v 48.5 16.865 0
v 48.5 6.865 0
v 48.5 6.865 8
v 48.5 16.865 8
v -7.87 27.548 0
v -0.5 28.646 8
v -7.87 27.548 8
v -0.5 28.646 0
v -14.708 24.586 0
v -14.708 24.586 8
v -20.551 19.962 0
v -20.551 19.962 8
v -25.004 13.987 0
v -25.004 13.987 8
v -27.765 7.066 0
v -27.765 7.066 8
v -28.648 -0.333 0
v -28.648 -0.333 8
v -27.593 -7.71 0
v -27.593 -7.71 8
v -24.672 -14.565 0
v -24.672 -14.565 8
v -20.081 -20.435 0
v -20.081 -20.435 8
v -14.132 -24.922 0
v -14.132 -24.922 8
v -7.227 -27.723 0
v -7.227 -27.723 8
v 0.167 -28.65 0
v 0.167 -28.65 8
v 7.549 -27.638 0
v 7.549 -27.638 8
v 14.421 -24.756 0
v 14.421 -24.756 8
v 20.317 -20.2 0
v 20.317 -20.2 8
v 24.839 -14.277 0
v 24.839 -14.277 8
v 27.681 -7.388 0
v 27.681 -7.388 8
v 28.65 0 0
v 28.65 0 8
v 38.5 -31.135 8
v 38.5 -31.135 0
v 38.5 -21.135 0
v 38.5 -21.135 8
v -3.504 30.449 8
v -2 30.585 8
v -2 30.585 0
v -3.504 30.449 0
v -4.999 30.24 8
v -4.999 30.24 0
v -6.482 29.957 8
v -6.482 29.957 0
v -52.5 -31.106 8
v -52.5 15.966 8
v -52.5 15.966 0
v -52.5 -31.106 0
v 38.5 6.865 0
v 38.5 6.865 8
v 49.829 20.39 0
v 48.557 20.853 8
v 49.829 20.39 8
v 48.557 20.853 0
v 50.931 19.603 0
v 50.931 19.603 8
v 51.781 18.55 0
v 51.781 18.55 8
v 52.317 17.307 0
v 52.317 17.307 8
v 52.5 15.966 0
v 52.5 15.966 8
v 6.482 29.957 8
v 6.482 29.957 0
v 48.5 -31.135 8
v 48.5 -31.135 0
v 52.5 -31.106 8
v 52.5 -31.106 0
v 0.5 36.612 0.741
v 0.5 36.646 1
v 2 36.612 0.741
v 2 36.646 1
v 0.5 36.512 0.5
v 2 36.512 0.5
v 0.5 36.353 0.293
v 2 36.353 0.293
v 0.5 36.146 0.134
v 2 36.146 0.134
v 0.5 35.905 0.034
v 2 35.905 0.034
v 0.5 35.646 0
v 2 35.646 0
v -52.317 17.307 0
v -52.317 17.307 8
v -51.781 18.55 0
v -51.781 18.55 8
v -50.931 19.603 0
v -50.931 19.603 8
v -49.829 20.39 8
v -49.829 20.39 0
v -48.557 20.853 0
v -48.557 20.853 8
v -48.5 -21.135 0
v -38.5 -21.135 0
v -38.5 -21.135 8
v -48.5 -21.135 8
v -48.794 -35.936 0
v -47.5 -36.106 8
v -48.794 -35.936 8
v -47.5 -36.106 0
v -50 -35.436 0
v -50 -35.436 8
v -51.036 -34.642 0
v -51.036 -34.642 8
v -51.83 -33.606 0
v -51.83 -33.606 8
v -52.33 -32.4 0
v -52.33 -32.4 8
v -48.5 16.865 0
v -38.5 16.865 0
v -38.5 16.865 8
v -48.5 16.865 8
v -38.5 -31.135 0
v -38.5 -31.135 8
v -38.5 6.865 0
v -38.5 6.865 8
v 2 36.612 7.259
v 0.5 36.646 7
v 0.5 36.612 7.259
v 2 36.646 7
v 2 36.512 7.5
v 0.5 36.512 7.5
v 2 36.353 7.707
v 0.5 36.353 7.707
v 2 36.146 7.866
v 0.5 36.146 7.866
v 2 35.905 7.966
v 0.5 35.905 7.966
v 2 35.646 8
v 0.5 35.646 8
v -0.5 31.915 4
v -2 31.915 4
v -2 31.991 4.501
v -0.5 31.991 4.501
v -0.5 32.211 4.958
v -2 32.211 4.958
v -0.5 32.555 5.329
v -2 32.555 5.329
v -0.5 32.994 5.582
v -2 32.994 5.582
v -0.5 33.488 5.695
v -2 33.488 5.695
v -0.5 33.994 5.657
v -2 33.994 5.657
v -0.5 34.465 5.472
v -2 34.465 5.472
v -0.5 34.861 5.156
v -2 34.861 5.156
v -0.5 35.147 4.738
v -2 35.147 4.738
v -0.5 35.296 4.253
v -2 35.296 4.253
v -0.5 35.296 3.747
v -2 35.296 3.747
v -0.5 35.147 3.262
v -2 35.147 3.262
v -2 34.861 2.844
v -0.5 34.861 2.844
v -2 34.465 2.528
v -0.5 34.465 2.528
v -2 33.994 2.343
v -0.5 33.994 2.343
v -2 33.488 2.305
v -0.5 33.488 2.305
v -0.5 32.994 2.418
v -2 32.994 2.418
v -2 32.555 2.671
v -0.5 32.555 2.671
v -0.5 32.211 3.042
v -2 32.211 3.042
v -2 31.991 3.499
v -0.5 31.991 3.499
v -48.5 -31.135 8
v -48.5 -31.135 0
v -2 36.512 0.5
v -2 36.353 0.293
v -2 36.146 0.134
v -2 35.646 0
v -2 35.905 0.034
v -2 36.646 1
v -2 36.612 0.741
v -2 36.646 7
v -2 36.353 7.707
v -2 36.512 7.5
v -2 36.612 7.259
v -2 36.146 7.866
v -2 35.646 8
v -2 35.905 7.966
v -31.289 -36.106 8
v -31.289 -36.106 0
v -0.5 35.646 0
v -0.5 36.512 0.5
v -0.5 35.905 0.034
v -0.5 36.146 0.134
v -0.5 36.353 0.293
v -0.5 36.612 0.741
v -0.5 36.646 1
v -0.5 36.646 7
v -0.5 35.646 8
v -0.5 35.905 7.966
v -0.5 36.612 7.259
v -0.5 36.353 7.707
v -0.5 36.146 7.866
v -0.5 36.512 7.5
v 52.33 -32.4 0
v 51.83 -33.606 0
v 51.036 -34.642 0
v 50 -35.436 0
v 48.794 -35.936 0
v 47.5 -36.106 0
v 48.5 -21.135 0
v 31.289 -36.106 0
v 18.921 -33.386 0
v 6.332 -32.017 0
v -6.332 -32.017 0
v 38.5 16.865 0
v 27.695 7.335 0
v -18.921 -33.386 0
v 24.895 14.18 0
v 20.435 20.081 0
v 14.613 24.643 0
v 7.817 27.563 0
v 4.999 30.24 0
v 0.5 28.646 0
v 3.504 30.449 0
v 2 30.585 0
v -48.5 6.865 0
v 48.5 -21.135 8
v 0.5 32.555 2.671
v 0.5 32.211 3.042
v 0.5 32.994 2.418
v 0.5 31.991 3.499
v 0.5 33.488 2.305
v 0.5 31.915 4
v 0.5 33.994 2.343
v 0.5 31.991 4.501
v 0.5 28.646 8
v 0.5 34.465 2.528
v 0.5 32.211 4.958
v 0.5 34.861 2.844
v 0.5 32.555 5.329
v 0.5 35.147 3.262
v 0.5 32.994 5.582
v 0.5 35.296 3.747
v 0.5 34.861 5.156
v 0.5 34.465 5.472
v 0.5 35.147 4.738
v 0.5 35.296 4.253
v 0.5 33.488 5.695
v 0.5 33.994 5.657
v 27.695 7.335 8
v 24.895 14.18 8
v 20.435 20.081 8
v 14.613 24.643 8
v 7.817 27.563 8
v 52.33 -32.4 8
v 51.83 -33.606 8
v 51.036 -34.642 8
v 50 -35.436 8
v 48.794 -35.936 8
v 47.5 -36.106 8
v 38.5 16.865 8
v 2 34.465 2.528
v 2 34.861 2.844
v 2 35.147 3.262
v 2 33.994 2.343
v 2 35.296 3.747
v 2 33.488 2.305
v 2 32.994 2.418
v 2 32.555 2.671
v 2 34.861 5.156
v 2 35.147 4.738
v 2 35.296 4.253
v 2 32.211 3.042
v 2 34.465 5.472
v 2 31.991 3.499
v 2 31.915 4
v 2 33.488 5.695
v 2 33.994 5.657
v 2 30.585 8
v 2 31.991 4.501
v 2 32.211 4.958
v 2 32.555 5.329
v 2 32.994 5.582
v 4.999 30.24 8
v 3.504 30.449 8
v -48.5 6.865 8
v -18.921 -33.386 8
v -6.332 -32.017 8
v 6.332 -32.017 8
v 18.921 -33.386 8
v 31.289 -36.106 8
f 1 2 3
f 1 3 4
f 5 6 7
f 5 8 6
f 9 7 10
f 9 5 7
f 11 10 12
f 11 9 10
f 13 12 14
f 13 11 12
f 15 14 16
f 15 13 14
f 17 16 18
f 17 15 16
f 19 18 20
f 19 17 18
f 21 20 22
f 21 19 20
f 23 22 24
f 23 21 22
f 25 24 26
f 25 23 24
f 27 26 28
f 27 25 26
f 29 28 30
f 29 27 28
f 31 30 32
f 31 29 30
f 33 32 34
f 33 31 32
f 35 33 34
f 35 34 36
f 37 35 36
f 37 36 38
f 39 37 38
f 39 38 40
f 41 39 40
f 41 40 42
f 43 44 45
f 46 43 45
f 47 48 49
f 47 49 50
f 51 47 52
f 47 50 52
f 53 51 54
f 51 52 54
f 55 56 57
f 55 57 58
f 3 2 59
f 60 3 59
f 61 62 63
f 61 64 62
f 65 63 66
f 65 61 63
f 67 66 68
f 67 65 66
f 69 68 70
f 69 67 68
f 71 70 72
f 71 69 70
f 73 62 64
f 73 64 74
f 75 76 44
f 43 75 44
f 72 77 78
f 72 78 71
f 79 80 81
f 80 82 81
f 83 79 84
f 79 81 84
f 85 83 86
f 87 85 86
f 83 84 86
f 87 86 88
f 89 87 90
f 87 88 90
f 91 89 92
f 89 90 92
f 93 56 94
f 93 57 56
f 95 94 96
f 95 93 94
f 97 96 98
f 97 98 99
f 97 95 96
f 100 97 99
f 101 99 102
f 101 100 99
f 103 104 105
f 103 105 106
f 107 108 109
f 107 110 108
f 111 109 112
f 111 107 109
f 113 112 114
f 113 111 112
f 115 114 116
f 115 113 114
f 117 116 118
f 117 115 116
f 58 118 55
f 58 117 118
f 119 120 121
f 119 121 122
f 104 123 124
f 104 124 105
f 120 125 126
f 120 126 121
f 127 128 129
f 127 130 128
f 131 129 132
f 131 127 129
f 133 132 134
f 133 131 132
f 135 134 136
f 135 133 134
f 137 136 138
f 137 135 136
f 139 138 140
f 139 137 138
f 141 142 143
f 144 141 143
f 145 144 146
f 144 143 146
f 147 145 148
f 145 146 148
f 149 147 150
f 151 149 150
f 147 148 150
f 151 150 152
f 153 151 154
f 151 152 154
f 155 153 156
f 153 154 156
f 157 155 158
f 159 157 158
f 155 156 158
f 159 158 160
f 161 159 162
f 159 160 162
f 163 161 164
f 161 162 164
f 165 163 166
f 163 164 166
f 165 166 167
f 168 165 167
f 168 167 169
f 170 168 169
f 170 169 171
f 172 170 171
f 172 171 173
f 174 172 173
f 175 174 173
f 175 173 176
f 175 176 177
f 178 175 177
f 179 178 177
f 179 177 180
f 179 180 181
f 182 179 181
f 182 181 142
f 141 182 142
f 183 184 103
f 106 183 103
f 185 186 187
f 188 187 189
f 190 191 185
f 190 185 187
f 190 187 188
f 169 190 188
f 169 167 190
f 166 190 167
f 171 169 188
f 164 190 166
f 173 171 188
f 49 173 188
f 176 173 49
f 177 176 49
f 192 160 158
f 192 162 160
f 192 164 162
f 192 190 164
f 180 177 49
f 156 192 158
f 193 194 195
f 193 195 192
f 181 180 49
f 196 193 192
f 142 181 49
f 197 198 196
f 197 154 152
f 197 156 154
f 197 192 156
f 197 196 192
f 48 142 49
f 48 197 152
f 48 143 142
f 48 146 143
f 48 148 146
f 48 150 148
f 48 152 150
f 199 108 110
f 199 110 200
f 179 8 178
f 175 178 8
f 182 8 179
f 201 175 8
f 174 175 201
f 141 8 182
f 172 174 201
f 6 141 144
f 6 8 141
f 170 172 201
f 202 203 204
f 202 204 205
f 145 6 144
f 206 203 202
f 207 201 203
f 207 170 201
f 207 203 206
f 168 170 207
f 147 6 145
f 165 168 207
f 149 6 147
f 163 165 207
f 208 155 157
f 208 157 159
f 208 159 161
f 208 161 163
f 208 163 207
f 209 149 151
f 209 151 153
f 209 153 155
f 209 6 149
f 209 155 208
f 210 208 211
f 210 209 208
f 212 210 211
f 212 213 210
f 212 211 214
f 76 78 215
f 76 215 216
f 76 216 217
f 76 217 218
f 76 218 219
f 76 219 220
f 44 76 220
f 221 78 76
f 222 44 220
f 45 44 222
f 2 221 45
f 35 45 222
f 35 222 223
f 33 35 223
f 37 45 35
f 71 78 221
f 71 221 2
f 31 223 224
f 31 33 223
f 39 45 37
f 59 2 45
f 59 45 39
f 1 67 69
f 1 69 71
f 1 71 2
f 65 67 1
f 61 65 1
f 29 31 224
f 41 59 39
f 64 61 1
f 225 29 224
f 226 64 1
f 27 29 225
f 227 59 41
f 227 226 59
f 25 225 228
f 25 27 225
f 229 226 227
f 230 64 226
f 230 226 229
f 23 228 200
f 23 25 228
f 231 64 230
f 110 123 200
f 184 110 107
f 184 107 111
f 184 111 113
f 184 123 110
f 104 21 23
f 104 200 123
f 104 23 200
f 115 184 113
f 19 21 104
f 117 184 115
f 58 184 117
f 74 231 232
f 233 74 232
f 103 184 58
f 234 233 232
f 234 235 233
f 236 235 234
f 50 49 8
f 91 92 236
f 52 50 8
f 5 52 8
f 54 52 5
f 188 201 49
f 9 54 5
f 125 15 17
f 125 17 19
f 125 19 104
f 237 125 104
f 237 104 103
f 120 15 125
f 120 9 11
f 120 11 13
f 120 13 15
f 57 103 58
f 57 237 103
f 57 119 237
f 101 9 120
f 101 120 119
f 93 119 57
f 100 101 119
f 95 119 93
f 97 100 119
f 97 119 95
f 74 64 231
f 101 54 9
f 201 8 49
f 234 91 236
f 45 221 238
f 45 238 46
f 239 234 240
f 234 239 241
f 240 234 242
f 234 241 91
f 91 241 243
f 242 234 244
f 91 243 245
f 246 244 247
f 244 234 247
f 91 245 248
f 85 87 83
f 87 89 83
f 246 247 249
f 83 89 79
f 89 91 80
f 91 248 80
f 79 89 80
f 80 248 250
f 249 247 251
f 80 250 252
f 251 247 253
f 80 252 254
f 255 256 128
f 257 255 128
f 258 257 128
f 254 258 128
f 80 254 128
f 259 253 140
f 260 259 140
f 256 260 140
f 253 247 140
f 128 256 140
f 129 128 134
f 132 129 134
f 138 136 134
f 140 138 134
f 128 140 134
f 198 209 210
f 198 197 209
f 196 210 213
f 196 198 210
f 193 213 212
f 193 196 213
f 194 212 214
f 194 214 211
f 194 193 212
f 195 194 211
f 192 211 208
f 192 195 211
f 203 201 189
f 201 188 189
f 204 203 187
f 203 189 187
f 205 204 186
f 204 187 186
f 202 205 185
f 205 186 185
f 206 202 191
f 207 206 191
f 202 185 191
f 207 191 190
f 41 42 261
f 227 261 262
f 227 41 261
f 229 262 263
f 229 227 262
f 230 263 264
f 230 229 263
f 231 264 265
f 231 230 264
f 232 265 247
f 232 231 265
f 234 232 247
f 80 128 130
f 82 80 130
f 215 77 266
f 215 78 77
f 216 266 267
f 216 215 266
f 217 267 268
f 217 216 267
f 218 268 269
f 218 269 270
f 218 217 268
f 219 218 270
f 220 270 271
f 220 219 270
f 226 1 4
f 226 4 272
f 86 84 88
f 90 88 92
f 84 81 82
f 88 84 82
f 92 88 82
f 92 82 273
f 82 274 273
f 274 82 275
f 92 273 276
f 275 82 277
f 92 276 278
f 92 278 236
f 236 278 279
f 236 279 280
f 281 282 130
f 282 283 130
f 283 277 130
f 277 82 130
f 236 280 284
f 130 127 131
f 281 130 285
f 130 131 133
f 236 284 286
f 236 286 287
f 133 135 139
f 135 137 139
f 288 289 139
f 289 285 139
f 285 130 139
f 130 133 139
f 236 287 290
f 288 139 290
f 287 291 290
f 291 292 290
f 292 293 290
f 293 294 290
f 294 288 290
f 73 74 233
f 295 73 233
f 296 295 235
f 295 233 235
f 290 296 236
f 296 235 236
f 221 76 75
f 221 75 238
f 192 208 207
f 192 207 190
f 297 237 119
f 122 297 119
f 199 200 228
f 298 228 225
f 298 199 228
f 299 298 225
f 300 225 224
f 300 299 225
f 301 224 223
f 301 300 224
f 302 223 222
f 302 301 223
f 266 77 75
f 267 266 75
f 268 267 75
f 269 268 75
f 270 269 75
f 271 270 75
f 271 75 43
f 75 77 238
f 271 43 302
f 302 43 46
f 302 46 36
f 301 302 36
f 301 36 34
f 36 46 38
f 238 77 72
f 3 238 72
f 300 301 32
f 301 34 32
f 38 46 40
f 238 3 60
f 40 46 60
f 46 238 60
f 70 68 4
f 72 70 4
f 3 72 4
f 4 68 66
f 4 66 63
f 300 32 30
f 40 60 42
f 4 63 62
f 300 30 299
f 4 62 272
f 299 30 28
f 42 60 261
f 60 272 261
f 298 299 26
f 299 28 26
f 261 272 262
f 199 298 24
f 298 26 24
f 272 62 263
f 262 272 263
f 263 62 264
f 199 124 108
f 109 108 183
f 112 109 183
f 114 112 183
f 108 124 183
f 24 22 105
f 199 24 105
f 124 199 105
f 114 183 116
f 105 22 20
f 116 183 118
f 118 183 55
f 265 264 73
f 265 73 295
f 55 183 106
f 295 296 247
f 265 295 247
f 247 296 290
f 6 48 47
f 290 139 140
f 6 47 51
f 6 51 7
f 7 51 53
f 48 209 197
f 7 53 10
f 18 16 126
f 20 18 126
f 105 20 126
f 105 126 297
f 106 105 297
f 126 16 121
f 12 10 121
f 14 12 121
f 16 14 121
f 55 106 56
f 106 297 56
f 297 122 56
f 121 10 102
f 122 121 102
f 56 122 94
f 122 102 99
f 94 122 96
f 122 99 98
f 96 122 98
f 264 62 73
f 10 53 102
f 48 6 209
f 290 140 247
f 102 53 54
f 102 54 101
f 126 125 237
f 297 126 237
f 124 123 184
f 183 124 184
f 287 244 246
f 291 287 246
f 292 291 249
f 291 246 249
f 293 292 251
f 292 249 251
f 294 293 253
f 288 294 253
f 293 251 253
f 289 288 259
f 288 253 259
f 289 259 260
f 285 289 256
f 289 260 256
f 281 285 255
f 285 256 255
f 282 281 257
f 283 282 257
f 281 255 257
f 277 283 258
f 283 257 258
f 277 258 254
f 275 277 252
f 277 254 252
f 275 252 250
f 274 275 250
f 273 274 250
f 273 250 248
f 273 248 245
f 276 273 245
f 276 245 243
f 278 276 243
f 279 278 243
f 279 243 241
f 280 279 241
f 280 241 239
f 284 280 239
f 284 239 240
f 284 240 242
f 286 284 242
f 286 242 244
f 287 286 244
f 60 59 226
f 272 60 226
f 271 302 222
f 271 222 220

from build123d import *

# Parameters (mm, degrees)
SKIZZE1_R                       = 30.65
SKIZZE1_R_2                     = 28.65
AUFSATZ_LINEAR_AUSTRAGEN1_DEPTH = 8
AUFSATZ_LINEAR_AUSTRAGEN2_DEPTH = 8
SKIZZE3_W                       = 1
SKIZZE3_H                       = 2.855309686
SCHNITT_LINEAR_AUSTRAGEN1_DEPTH = 10
AUFSATZ_LINEAR_AUSTRAGEN3_DEPTH = 8
SKIZZE5_R                       = 1.7
SCHNITT_LINEAR_AUSTRAGEN2_DEPTH = 8
VERRUNDUNG2_R                   = 1
SKIZZE7_W                       = 10
SKIZZE7_H                       = 10
SCHNITT_LINEAR_AUSTRAGEN4_DEPTH = 10
VERRUNDUNG3_R                   = 5


with BuildPart() as part:
    # Skizze1 → Aufsatz-Linear austragen1 (new body)
    with BuildSketch(Plane.XY):
        Circle(SKIZZE1_R)
        Circle(SKIZZE1_R_2, mode=Mode.SUBTRACT)
    extrude(amount=AUFSATZ_LINEAR_AUSTRAGEN1_DEPTH)

    # Skizze2 → Aufsatz-Linear austragen2 (add)
    with BuildSketch(Plane.XY.offset(8)):
        with BuildLine():
            Line((52.5, -36.106090228), (52.5, 20))
            Line((52.5, 20), (6.481641536, 29.956815969))
            Line((6.481641536, 29.956815969), (6.460494255, 29.859077581))
            ThreePointArc((6.460494255, 29.859077581), (26.986544825, -14.318830203), (-21.103143411, -22.089812995))
            ThreePointArc((-21.103143411, -22.089812995), (-29.404257147, 8.288073457), (-6.460494255, 29.859077581))
            Line((-6.460494255, 29.859077581), (-6.481641536, 29.956815969))
            Line((-6.481641536, 29.956815969), (-52.5, 20))
            Line((-52.5, 20), (-52.5, -36.106090228))
            Line((-52.5, -36.106090228), (-31.288777705, -36.106090228))
            ThreePointArc((-31.288777705, -36.106090228), (0, -31.845839174), (31.288777705, -36.106090228))
            Line((31.288777705, -36.106090228), (52.5, -36.106090228))
        make_face()
    extrude(amount=-AUFSATZ_LINEAR_AUSTRAGEN2_DEPTH)

    # Skizze3 → Schnitt-Linear austragen1 (cut)
    with BuildSketch(Plane.XY.offset(8)):
        with Locations((0, 29.34103969)):
            Rectangle(SKIZZE3_W, SKIZZE3_H)
    extrude(amount=-SCHNITT_LINEAR_AUSTRAGEN1_DEPTH, mode=Mode.SUBTRACT)

    # Skizze4 → Aufsatz-Linear austragen3 (add)
    with BuildSketch(Plane.XY.offset(8)):
        Polygon((0.5, 30.645921425), (0.5, 36.645921425), (2, 36.645921425), (2, 29.02715443), align=None)
        Polygon((-2, 29.02715443), (-0.5, 30.645921425), (-0.5, 36.645921425), (-2, 36.645921425), align=None)
    extrude(amount=-AUFSATZ_LINEAR_AUSTRAGEN3_DEPTH)

    # Skizze5 → Schnitt-Linear austragen2 (cut)
    with BuildSketch(Plane.ZY.offset(2)):
        with Locations(Location((4, 33.615299481, 0), (0, 0, 270))):
            Circle(SKIZZE5_R)
    extrude(amount=-SCHNITT_LINEAR_AUSTRAGEN2_DEPTH, mode=Mode.SUBTRACT)

    # Verrundung2
    verrundung2_edges = [part.edges().sort_by_distance(p)[0] for p in [
        (1.25, 36.645921425, 8),
        (1.25, 36.645921425, 0),
        (-1.25, 36.645921425, 8),
        (-1.25, 36.645921425, 0),
    ]]
    fillet(verrundung2_edges, radius=VERRUNDUNG2_R)

    # Skizze7 → Schnitt-Linear austragen4 (cut)
    with BuildSketch(Plane(origin=(0, 0, 0), x_dir=(-1, 0, 0), z_dir=(0, 0, -1))):
        with Locations((-43.5, 11.86546468)):
            Rectangle(SKIZZE7_W, SKIZZE7_H)
        with Locations((-43.5, -26.13453532)):
            Rectangle(SKIZZE7_W, SKIZZE7_H)
        with Locations((43.5, -26.13453532)):
            Rectangle(SKIZZE7_W, SKIZZE7_H)
        with Locations((43.5, 11.86546468)):
            Rectangle(SKIZZE7_W, SKIZZE7_H)
    extrude(amount=-SCHNITT_LINEAR_AUSTRAGEN4_DEPTH, mode=Mode.SUBTRACT)

    # Verrundung3
    verrundung3_edges = [part.edges().sort_by_distance(p)[0] for p in [
        (52.5, 20, 4),
        (52.5, -36.106090228, 4),
        (-52.5, -36.106090228, 4),
        (-52.5, 20, 4),
    ]]
    fillet(verrundung3_edges, radius=VERRUNDUNG3_R)


solid = part.part
